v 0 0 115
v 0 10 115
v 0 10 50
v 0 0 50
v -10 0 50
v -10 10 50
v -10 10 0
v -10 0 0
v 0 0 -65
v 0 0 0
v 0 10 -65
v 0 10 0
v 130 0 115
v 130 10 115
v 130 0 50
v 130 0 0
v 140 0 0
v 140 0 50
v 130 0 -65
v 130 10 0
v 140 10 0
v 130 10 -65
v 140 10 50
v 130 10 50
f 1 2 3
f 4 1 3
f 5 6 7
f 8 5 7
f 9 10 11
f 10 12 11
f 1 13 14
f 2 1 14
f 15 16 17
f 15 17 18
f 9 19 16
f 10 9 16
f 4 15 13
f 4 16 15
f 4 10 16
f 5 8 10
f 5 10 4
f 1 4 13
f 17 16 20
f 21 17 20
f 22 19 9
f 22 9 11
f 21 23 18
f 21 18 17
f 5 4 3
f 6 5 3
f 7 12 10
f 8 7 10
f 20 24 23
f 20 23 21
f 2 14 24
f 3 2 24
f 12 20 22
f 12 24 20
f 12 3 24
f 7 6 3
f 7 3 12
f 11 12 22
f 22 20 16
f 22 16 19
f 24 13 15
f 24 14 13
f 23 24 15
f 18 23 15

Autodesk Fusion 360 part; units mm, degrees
sketch "Sketch1" plane through (0, 0, 0) normal (1, 0, 0) x (0, 0, -1)
  line L0 (0, 0) -> (-50, 0)
  line L1 (-50, 0) -> (-50, 10)
  line L2 (-50, 10) -> (0, 10)
  line L3 (0, 10) -> (0, 0)
  line L4 (0, 0) -> (65, 0)
  line L5 (65, 0) -> (65, 10)
  line L6 (65, 10) -> (0, 10)
  line L7 (0, 10) -> (0, 0)
  line L8 (-50, 0) -> (-115, 0)
  line L9 (-115, 0) -> (-115, 10)
  line L10 (-115, 10) -> (-50, 10)
  line L11 (-50, 10) -> (-50, 0)
  dimension "d1" = 50
  dimension "d2" = 10
  dimension "d3" = 65
  dimension "d4" = 65
  dimension "d5" = 10
  dimension "d6" = 10
extrude "Extrude1" add sketch "Sketch1" along normal blind 130
extrude "Extrude2" add sketch "Sketch1" against normal blind 10 contours L0 L1 L2 L3 L7 L11
sketch "Sketch2" plane through (130, 0, 0) normal (1, 0, 0) x (0, 0, -1)
  line L0 (-115, 0) -> (65, 0)
  line L1 (65, 0) -> (65, 10)
  line L2 (65, 10) -> (-115, 10)
  line L3 (-115, 10) -> (-115, 0)
  line L4 (-50, 0) -> (0, 0)
  line L5 (0, 0) -> (0, 10)
  line L6 (0, 10) -> (-50, 10)
  line L7 (-50, 10) -> (-50, 0)
extrude "Extrude3" add sketch "Sketch2" along normal blind 10 contours L0 L2 L4 L5 L6 L7
